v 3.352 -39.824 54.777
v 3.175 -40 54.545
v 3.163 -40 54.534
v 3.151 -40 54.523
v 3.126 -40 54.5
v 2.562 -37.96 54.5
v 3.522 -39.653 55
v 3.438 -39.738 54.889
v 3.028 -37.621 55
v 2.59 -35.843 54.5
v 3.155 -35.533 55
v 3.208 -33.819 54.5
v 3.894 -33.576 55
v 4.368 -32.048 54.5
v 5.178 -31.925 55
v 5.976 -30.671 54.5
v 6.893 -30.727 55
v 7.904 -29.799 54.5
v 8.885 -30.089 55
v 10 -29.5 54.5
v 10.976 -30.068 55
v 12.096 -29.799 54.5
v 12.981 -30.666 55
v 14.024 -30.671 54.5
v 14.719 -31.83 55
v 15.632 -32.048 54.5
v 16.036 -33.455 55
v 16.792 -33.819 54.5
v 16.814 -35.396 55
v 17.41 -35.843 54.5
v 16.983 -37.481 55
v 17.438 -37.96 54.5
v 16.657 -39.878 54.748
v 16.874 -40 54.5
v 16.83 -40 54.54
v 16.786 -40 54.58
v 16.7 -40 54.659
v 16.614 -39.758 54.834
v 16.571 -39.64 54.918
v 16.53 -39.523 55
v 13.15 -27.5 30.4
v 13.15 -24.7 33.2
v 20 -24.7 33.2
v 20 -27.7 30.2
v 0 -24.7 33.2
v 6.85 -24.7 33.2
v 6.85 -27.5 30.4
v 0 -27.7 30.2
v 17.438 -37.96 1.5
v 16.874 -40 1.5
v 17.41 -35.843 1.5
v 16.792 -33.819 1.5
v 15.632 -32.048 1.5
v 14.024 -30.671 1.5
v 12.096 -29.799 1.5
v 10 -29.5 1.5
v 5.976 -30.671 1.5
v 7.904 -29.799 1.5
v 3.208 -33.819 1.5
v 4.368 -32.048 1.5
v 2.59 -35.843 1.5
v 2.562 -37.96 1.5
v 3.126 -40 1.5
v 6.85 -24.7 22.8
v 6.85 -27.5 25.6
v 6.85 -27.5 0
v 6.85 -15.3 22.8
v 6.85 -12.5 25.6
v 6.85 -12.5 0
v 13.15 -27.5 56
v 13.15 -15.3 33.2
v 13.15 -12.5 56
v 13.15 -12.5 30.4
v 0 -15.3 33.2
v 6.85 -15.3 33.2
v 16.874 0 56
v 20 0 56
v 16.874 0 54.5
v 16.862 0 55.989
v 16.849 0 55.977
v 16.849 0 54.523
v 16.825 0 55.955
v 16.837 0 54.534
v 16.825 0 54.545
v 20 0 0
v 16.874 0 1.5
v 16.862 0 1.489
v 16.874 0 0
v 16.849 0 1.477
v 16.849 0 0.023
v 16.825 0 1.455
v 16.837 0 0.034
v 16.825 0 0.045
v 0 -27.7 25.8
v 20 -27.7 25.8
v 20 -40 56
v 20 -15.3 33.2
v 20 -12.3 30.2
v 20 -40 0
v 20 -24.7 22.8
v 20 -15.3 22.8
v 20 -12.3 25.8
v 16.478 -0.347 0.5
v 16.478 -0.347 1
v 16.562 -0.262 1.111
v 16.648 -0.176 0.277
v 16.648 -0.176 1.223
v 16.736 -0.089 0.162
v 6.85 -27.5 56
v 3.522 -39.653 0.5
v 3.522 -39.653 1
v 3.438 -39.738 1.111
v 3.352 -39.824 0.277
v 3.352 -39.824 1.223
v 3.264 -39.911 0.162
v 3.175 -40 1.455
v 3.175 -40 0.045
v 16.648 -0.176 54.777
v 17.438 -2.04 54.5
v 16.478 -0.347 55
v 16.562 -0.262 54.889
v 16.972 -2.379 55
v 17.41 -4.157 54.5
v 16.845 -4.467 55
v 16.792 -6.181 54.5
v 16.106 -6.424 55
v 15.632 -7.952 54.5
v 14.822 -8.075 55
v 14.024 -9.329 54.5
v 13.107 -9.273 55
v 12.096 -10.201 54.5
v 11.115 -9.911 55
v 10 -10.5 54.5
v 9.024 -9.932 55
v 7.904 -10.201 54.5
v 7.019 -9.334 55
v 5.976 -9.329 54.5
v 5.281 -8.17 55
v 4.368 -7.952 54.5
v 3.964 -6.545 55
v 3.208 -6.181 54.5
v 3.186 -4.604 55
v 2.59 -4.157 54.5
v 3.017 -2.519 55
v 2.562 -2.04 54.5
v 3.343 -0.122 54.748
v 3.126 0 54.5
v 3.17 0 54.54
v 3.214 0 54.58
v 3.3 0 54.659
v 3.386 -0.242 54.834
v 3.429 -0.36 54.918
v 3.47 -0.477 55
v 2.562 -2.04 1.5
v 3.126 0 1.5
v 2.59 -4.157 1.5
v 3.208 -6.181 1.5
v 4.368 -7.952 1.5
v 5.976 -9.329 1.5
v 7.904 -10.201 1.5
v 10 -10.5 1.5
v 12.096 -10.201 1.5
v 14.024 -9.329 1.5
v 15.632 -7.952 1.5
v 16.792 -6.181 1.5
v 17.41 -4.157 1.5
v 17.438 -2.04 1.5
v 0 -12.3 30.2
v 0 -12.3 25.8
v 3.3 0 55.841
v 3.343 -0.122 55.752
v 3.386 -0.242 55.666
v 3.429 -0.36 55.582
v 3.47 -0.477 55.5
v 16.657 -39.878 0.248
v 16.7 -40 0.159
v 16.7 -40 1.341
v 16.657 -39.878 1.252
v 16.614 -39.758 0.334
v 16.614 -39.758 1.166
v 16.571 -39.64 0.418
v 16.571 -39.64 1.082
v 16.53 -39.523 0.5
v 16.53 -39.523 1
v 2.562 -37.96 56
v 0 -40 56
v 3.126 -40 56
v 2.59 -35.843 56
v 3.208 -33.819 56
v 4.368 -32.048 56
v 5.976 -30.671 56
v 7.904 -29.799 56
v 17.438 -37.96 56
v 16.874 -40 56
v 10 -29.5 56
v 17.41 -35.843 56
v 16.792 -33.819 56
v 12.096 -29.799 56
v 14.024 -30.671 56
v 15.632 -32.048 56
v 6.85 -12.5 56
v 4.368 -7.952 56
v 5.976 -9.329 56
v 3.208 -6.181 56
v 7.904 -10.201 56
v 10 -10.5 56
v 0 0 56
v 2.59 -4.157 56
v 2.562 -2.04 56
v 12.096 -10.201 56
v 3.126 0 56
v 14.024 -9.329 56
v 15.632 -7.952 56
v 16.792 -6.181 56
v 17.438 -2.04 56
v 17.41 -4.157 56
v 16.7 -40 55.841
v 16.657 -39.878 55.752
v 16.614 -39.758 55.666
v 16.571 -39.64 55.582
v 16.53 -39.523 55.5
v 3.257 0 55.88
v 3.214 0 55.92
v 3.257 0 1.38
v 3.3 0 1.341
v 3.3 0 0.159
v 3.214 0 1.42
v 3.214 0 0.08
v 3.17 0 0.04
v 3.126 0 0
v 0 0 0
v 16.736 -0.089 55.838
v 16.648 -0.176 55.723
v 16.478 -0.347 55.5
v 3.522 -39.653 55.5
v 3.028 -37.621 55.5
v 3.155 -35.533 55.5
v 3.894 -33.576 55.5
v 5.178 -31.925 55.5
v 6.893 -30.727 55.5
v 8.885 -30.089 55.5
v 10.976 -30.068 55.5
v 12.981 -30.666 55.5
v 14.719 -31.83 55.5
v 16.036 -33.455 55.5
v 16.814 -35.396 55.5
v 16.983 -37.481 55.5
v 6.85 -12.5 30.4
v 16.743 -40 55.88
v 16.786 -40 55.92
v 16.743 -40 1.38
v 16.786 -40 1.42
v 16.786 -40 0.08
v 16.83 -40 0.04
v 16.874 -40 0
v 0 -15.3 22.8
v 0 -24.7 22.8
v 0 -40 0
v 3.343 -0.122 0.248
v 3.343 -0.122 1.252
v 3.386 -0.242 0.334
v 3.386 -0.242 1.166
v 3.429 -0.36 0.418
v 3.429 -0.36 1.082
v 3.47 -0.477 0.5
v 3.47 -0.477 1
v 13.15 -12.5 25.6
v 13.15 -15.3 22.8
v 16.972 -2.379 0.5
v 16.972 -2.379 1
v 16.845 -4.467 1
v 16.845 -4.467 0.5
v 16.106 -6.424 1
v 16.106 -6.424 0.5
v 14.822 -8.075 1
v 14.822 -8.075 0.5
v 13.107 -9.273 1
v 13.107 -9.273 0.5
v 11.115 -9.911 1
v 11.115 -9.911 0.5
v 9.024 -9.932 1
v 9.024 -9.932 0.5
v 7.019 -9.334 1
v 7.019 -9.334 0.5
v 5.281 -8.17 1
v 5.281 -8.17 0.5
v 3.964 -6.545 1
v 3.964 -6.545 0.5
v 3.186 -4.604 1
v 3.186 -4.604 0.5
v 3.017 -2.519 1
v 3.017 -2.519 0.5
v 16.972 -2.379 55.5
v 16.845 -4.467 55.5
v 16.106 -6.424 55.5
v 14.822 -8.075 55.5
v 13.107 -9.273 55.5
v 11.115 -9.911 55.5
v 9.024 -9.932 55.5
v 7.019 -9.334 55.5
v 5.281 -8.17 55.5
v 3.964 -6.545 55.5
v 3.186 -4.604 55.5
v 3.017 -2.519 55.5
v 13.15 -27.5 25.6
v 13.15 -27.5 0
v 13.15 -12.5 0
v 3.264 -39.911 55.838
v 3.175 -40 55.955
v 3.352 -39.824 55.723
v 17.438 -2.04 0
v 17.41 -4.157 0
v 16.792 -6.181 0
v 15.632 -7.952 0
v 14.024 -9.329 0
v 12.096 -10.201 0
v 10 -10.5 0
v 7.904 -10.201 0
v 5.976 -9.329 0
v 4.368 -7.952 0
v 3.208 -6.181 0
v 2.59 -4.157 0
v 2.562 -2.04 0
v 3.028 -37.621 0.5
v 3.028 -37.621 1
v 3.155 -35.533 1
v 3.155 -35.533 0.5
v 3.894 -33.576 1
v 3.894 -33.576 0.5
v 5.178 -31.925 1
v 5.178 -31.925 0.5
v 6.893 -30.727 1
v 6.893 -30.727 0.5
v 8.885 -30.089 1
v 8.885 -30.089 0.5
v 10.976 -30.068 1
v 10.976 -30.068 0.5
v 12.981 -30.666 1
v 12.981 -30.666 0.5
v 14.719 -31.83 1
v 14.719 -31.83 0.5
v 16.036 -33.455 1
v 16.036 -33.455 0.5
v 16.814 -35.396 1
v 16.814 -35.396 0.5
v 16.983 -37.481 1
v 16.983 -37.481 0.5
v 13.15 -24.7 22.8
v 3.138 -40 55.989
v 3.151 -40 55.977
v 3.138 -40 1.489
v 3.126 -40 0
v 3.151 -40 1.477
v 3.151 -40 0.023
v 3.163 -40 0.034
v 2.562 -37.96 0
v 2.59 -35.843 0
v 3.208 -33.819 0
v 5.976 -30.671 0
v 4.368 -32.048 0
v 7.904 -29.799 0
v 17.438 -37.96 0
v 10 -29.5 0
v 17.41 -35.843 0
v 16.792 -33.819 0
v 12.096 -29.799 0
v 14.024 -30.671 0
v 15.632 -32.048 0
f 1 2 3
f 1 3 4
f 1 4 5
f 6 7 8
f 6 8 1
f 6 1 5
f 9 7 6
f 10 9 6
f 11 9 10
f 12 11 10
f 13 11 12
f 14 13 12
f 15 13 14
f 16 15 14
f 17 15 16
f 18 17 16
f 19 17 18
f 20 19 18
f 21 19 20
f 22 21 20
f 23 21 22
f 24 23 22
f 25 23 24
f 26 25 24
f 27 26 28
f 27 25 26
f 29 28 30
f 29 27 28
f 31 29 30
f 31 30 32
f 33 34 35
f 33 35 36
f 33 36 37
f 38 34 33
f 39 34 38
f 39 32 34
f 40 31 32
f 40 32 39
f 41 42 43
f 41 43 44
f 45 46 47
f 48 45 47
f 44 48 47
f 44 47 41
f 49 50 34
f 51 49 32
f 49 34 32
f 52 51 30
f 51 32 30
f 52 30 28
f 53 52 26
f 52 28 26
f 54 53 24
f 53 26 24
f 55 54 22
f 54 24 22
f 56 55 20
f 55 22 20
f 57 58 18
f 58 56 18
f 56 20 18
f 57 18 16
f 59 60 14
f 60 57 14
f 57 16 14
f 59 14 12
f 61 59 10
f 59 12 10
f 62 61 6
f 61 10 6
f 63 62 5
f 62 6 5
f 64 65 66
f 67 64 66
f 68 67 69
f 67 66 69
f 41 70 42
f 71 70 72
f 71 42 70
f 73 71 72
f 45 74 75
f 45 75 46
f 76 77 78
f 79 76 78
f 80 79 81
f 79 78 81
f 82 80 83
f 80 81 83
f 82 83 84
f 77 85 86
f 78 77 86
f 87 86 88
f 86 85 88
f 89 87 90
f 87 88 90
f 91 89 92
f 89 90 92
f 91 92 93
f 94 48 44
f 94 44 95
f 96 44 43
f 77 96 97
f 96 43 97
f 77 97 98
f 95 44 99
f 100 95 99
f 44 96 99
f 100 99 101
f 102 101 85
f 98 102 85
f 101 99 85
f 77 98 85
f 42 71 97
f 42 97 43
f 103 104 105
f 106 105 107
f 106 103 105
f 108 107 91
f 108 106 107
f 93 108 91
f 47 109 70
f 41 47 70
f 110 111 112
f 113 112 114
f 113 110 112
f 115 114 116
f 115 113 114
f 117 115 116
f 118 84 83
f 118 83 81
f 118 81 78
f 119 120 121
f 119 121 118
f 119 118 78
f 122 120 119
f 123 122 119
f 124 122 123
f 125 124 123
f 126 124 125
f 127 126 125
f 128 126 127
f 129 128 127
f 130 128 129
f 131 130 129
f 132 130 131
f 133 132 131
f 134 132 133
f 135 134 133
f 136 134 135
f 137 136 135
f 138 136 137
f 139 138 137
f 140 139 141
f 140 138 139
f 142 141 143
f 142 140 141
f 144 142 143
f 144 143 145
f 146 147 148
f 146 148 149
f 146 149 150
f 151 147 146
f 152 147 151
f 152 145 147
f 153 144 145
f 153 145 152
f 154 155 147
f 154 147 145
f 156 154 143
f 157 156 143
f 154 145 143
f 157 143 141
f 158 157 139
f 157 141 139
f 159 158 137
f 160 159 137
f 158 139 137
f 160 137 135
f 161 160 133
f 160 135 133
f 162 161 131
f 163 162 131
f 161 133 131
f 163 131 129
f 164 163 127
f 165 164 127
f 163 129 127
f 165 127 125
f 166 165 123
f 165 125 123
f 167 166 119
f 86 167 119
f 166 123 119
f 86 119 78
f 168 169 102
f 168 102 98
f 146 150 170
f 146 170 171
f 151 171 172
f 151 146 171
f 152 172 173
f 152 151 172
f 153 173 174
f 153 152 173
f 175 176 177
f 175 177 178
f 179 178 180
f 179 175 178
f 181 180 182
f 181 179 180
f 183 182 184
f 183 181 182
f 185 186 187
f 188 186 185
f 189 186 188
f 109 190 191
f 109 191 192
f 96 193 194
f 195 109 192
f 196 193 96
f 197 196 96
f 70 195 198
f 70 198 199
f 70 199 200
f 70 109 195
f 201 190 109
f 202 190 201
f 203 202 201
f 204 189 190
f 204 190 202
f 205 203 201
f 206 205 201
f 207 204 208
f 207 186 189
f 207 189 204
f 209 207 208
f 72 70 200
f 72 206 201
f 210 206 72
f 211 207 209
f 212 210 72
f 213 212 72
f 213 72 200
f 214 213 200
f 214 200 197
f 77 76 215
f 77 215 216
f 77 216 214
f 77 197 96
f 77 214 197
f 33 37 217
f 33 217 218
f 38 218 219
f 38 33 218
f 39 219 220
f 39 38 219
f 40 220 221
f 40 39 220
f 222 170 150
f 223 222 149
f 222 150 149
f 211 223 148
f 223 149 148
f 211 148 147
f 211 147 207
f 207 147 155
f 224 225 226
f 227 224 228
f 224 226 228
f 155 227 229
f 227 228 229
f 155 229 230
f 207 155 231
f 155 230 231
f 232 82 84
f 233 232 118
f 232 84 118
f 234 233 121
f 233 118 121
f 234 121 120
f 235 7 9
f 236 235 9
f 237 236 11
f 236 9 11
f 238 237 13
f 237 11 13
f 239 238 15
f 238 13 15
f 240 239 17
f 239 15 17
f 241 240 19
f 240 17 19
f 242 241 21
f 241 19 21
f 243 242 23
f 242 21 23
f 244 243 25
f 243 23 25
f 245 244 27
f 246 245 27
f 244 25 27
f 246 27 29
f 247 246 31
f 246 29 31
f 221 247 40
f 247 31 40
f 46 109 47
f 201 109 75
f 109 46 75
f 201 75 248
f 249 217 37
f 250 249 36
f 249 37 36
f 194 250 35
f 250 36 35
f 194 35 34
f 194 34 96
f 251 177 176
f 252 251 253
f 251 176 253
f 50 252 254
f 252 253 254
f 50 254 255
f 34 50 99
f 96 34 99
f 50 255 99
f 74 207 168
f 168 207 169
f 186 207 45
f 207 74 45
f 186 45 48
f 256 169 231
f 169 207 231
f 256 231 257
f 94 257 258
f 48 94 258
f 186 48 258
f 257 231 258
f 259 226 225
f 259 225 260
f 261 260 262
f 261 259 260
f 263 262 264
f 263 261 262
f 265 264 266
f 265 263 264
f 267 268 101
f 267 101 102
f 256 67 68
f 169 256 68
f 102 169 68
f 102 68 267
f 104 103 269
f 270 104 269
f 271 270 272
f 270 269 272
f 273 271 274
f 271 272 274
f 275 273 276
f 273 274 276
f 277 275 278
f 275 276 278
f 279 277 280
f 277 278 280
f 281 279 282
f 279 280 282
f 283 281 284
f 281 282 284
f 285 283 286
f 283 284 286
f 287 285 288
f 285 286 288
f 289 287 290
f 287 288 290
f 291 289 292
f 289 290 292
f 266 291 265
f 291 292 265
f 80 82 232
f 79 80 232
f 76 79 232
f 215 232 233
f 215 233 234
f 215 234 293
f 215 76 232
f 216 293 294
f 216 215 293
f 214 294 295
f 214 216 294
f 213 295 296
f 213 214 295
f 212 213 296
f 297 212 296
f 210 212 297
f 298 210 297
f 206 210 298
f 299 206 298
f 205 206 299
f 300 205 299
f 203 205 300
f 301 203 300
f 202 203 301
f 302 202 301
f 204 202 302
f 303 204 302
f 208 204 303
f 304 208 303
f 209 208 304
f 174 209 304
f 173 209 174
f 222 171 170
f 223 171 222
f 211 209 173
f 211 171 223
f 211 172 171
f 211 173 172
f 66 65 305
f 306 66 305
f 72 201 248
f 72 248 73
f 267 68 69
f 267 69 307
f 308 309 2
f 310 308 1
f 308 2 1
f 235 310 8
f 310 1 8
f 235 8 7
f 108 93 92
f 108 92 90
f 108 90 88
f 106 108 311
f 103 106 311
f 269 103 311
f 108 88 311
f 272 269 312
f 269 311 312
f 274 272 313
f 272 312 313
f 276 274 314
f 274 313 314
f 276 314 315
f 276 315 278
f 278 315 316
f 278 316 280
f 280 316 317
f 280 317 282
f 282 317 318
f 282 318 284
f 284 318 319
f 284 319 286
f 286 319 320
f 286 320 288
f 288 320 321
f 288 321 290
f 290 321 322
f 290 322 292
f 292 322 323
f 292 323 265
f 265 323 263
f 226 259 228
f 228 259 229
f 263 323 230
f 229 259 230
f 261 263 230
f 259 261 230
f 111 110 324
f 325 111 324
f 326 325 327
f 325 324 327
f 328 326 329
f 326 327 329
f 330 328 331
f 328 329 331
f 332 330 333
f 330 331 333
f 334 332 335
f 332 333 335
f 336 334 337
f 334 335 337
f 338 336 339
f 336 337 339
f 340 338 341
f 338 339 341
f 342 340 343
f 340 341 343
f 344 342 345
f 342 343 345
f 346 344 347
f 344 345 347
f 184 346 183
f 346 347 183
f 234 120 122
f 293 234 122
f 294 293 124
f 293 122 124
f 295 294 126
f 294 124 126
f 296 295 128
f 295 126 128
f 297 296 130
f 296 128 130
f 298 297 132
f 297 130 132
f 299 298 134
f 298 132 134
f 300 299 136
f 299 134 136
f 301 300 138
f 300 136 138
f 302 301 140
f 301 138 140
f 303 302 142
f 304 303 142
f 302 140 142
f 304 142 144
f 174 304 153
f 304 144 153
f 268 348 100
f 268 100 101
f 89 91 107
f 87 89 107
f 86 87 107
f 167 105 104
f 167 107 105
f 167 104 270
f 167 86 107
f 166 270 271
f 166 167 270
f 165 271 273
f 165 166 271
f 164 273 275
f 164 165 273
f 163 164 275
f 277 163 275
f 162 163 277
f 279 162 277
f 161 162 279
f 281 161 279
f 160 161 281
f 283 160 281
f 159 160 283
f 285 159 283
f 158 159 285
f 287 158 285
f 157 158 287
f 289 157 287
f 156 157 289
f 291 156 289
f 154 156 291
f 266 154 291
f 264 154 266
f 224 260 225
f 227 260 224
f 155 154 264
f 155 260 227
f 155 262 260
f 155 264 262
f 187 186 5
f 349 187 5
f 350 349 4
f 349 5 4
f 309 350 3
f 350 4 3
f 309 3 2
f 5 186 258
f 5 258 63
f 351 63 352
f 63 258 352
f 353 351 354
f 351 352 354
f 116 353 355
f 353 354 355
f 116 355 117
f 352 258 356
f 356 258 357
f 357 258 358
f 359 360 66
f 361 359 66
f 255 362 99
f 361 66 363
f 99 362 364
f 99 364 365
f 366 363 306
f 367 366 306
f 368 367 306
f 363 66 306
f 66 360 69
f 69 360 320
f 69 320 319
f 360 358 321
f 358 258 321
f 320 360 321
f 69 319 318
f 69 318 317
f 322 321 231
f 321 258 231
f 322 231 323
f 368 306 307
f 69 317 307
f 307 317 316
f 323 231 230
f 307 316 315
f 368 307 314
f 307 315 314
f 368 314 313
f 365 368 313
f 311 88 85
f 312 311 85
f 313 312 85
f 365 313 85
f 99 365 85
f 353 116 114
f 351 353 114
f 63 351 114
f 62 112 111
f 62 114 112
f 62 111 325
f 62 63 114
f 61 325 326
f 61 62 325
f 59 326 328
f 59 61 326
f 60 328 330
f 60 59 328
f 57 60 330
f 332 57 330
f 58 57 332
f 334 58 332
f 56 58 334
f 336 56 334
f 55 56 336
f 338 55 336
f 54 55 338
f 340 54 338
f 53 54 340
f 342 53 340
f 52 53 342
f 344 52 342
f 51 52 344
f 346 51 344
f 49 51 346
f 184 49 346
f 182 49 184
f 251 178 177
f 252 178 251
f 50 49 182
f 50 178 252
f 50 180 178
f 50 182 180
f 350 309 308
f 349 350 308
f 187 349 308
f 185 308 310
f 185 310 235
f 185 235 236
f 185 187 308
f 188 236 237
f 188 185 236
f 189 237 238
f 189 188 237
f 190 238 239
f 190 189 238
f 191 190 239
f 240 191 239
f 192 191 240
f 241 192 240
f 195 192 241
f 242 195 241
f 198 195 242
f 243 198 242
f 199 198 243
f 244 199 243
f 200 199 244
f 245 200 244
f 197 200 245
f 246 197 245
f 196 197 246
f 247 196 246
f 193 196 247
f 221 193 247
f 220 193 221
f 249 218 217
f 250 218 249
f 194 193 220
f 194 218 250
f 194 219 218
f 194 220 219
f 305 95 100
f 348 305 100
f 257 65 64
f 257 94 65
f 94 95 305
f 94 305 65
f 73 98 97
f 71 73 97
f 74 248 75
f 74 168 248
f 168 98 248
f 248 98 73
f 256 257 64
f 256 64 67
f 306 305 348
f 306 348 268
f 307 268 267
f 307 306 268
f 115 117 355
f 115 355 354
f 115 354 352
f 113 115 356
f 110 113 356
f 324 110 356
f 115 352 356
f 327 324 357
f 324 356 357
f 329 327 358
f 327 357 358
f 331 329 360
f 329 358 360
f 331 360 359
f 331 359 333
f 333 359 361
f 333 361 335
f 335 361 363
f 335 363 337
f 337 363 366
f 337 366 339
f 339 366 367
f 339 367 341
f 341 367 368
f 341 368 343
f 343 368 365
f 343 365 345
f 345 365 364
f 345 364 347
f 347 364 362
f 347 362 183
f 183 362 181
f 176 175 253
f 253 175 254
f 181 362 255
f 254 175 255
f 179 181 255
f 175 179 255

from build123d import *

# Parameters (mm, degrees)
SKETCH_1_W          = 6.3
SKETCH_1_H          = 15
EXTRUDE_1_DEPTH     = 56
CUT_EXTRUDE_START   = -1.5
SKETCH_2_R          = 7.5
CUT_EXTRUDE_1_DEPTH = 53
CHAMFER_1_SIZE      = 0.5
CHAMFER_1_SIZE_2    = 0.37535302
CUT_EXTRUDE_5_DEPTH = 57


with BuildPart() as part:
    # 草图1 → 凸台-拉伸1 (new body)
    with BuildSketch(Plane.XY):
        with BuildLine():
            Line((16.32455532, -40), (20, -40))
            Line((20, -40), (20, 0))
            Line((20, 0), (16.32455532, 0))
            ThreePointArc((16.32455532, 0), (10, -10), (3.67544468, 0))
            Line((3.67544468, 0), (0, 0))
            Line((0, 0), (0, -40))
            Line((0, -40), (3.67544468, -40))
            ThreePointArc((3.67544468, -40), (10, -30), (16.32455532, -40))
        make_face()
        with Locations((10, -20)):
            Rectangle(SKETCH_1_W, SKETCH_1_H, mode=Mode.SUBTRACT)
    extrude(amount=EXTRUDE_1_DEPTH)

    # 草图2 → 切除-拉伸1 (cut)
    with BuildSketch(Plane.XY.offset(56).offset(CUT_EXTRUDE_START)):
        with Locations((10, -3)):
            Circle(SKETCH_2_R)
        with Locations((10, -37)):
            Circle(SKETCH_2_R)
    extrude(amount=-CUT_EXTRUDE_1_DEPTH, mode=Mode.SUBTRACT)

    # 倒角1
    # the kernel refuses this chamfer: 0.5, 0.37535302 mm, written as the material it takes off along each edge
    with BuildSketch(Plane(origin=(10, -37, 56), x_dir=(-0.8097393602715859, -0.5867897139750857, 0), z_dir=(0.5867897139750857, -0.8097393602715859, 0))) as chamfer_1_piece_1:
        Polygon((7, CHAMFER_1_SIZE), (7 + CHAMFER_1_SIZE, 0), (7, 0), align=None)
    revolve(axis=Axis((10, -37, 56), (0, 0, -1)), revolution_arc=251.859051953, mode=Mode.SUBTRACT)
    with BuildSketch(Plane(origin=(10, -37, 54.5), x_dir=(-0.8097393602715859, -0.5867897139750857, 0), z_dir=(0.5867897139750857, -0.8097393602715859, 0))) as chamfer_1_piece_2:
        Polygon((7 + CHAMFER_1_SIZE, 0), (7, -CHAMFER_1_SIZE), (7, 0), align=None)
    revolve(axis=Axis((10, -37, 54.5), (0, 0, -1)), revolution_arc=251.859051953, mode=Mode.SUBTRACT)
    with BuildSketch(Plane(origin=(10, -37, 1.5), x_dir=(-0.8097393602715859, -0.5867897139750857, 0), z_dir=(0.5867897139750857, -0.8097393602715859, 0))) as chamfer_1_piece_3:
        Polygon((7, CHAMFER_1_SIZE), (7 + CHAMFER_1_SIZE, 0), (7, 0), align=None)
    revolve(axis=Axis((10, -37, 1.5), (0, 0, -1)), revolution_arc=251.859051953, mode=Mode.SUBTRACT)
    with BuildSketch(Plane(origin=(10, -37, 0), x_dir=(-0.8097393602715859, -0.5867897139750857, 0), z_dir=(0.5867897139750857, -0.8097393602715859, 0))) as chamfer_1_piece_4:
        Polygon((7, -CHAMFER_1_SIZE), (7 + CHAMFER_1_SIZE, 0), (7, 0), align=None)
    revolve(axis=Axis((10, -37, 0), (0, 0, -1)), revolution_arc=251.859051953, mode=Mode.SUBTRACT)
    with BuildSketch(Plane(origin=(10, -3, 1.5), x_dir=(0.809739360271586, 0.5867897139750856, 0), z_dir=(-0.5867897139750856, 0.809739360271586, 0))) as chamfer_1_piece_5:
        Polygon((7, CHAMFER_1_SIZE), (7 + CHAMFER_1_SIZE, 0), (7, 0), align=None)
    revolve(axis=Axis((10, -3, 1.5), (0, 0, -1)), revolution_arc=251.859051953, mode=Mode.SUBTRACT)
    with BuildSketch(Plane(origin=(10, -3, 0), x_dir=(0.809739360271586, 0.5867897139750856, 0), z_dir=(-0.5867897139750856, 0.809739360271586, 0))) as chamfer_1_piece_6:
        Polygon((7, -CHAMFER_1_SIZE), (7 + CHAMFER_1_SIZE, 0), (7, 0), align=None)
    revolve(axis=Axis((10, -3, 0), (0, 0, -1)), revolution_arc=251.859051953, mode=Mode.SUBTRACT)
    with BuildSketch(Plane(origin=(10, -3, 56), x_dir=(0.809739360271586, 0.5867897139750855, 0), z_dir=(-0.5867897139750855, 0.809739360271586, 0))) as chamfer_1_piece_7:
        Polygon((7, CHAMFER_1_SIZE), (7 + CHAMFER_1_SIZE, 0), (7, 0), align=None)
    revolve(axis=Axis((10, -3, 56), (0, 0, -1)), revolution_arc=251.859051953, mode=Mode.SUBTRACT)
    with BuildSketch(Plane(origin=(10, -3, 54.5), x_dir=(0.809739360271586, 0.5867897139750855, 0), z_dir=(-0.5867897139750855, 0.809739360271586, 0))) as chamfer_1_piece_8:
        Polygon((7 + CHAMFER_1_SIZE, 0), (7, -CHAMFER_1_SIZE), (7, 0), align=None)
    revolve(axis=Axis((10, -3, 54.5), (0, 0, -1)), revolution_arc=251.859051953, mode=Mode.SUBTRACT)
    with BuildSketch(Plane(origin=(16.32455532, 0, 53.214158506), x_dir=(1, 0, 0), z_dir=(0, 0, 1)), Plane(origin=(3.67544468, -40, 53.214158506), x_dir=(-1, 0, 0), z_dir=(0, 0, 1))) as chamfer_1_piece_9:
        with BuildLine():
            Line((CHAMFER_1_SIZE, 0), (0.153157056, -0.346842944))
            ThreePointArc((0.153157056, -0.346842944), (0.080388037, -0.175694672), (0, 0))
            Line((0, 0), (CHAMFER_1_SIZE, 0))
        make_face()
    extrude(amount=4.071682988, mode=Mode.SUBTRACT)
    with BuildSketch(Plane(origin=(16.32455532, 0, -1.285841494), x_dir=(0.4039450974717048, -0.9147832301854768, 0), z_dir=(0, 0, 1)), Plane(origin=(3.67544468, -40, -1.285841494), x_dir=(-0.4039450974717028, 0.9147832301854776, 0), z_dir=(0, 0, 1))) as chamfer_1_piece_10:
        with BuildLine():
            Line((0.37915315, 0), (CHAMFER_1_SIZE * 0.403945097472, CHAMFER_1_SIZE * 0.914783230185))
            Line((CHAMFER_1_SIZE * 0.403945097472, CHAMFER_1_SIZE * 0.914783230185), (0, 0))
            ThreePointArc((0, 0), (0.193194893, 0.002566627), (0.37915315, 0))
        make_face()
    extrude(amount=4.071682988, mode=Mode.SUBTRACT)
    with BuildSketch(Plane(origin=(3.67544468, 0, -1.336191622), x_dir=(-1, 0, 0), z_dir=(0, 0, 1)), Plane(origin=(3.67544468, 0, 53.163808378), x_dir=(-1, 0, 0), z_dir=(0, 0, 1)), Plane(origin=(16.32455532, -40, -1.336191622), x_dir=(1, 0, 0), z_dir=(0, 0, 1)), Plane(origin=(16.32455532, -40, 53.163808378), x_dir=(1, 0, 0), z_dir=(0, 0, 1))) as chamfer_1_piece_11:
        with BuildLine():
            Line((CHAMFER_1_SIZE_2, 0), (0.205125138, 0.477447103))
            ThreePointArc((0.205125138, 0.477447103), (0.109888705, 0.243565694), (0, 0))
            Line((0, 0), (CHAMFER_1_SIZE_2, 0))
        make_face()
    extrude(amount=4.172383245, mode=Mode.SUBTRACT)

    # 草图3 → 切除-拉伸5 (cut)
    with BuildSketch(Plane.ZY):
        Polygon((25.8, -12.3), (30.2, -12.3), (33.2, -15.3), (33.2, -24.7), (30.2, -27.7), (25.8, -27.7), (22.8, -24.7), (22.8, -15.3), align=None)
    extrude(amount=-CUT_EXTRUDE_5_DEPTH, mode=Mode.SUBTRACT)


solid = part.part
